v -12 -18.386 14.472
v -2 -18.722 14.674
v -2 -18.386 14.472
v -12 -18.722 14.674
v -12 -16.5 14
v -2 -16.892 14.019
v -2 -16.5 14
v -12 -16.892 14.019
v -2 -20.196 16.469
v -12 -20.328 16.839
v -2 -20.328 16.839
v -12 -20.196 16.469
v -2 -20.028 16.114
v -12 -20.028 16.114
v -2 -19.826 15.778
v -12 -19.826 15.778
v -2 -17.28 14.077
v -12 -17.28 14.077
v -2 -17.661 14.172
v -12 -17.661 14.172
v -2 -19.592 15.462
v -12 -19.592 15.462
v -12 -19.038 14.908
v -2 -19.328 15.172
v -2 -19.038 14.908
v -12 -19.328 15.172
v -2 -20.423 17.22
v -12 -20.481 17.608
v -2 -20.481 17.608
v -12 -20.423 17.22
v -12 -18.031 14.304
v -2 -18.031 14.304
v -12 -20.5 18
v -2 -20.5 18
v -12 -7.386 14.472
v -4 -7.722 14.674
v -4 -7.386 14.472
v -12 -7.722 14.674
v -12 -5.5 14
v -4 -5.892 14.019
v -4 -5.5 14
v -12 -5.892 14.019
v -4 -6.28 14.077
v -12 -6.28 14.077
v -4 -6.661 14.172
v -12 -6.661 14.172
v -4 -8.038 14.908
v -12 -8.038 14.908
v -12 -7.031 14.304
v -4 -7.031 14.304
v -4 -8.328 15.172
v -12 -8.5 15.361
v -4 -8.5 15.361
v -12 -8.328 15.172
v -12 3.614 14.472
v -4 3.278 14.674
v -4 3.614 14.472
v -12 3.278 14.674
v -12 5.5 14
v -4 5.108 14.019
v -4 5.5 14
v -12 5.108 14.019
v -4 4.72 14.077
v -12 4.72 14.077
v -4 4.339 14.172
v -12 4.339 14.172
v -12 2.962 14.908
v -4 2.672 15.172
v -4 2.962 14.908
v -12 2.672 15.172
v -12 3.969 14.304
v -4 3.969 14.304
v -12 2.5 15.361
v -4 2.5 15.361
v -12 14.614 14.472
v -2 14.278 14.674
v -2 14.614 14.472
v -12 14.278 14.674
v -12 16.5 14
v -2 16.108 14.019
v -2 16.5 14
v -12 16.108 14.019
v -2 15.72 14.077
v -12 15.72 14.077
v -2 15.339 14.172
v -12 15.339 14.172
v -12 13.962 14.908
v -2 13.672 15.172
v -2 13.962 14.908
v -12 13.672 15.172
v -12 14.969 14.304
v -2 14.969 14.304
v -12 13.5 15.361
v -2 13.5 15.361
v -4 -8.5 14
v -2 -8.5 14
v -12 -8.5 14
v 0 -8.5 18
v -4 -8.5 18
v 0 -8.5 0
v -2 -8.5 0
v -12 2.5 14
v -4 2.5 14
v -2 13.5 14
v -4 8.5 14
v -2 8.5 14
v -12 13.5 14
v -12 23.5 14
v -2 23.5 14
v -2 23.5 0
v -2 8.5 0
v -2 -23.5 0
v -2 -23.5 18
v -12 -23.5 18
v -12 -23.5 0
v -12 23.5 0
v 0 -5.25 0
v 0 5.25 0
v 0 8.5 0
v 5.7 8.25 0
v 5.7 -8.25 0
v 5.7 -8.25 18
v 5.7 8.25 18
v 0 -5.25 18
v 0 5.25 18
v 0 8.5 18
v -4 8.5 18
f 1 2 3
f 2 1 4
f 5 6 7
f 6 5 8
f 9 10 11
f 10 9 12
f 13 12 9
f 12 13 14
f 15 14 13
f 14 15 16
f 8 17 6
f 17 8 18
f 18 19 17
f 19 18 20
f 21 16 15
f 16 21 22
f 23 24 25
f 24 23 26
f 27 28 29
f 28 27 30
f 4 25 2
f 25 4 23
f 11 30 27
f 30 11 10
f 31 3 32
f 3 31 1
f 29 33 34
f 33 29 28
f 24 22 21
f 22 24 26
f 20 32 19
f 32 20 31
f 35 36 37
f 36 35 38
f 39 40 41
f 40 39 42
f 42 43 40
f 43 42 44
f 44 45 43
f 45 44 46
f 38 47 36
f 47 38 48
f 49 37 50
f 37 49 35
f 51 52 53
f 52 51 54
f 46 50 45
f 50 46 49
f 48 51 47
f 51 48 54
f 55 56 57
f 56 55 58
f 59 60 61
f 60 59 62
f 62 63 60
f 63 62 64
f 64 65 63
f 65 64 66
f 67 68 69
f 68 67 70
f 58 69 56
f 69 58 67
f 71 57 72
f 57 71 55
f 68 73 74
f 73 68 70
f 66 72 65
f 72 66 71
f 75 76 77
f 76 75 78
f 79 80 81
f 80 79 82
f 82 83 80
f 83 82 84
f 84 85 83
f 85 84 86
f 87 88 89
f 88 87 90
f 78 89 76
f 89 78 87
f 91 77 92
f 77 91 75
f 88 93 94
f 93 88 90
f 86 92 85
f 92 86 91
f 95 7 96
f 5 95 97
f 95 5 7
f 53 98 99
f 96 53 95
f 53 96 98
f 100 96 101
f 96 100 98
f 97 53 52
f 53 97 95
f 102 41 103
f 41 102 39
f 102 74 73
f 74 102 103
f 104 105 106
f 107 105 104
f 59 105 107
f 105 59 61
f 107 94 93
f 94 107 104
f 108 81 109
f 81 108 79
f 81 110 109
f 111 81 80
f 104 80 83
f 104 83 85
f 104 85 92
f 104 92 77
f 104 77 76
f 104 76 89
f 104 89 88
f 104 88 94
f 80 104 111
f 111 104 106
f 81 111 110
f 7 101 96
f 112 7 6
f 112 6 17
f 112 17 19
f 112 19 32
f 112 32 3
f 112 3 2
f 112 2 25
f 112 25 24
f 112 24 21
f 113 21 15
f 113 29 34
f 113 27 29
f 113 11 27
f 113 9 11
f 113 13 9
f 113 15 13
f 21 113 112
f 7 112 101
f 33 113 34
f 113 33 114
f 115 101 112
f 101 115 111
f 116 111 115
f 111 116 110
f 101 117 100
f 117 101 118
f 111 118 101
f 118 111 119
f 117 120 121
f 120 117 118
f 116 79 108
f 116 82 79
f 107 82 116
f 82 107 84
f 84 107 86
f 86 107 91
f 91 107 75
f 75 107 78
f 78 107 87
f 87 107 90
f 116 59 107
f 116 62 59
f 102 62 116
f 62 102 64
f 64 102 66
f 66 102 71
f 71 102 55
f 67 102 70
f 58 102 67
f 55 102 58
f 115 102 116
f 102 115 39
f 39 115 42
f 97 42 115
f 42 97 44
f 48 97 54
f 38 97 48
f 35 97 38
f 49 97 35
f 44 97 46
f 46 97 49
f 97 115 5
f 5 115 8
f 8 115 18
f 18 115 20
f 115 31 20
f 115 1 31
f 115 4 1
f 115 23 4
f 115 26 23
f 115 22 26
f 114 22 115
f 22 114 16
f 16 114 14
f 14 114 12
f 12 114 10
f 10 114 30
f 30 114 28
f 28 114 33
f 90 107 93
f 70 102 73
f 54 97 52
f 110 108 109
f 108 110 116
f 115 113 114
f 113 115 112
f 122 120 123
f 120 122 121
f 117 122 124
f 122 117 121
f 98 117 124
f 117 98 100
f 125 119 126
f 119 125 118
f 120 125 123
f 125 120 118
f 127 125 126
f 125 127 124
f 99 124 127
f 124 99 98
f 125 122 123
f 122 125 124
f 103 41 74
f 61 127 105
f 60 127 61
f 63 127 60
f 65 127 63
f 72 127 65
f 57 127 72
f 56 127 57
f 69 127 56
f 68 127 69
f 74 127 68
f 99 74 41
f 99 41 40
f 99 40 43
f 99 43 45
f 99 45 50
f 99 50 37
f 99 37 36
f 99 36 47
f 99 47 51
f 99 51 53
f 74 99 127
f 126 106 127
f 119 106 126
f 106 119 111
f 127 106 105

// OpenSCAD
// file: stand_cable_clamp_common.scad
// stand_cable_clamp_common.scad — modular cable clamp for round stand poles.
//
// A split C-clamp pops over the pole and an M5 bolt + wingnut cinches it tight
// (the bolt head is captured in a hex pocket, so you only turn the wingnut —
// tool-free reposition). A dovetail on the clamp face takes slide-on cable
// heads, so one clamp accepts any attachment.
//
//   clamp(tube_d)   — the pole clamp (set tube_d to your pole OD)
//   head_hook()     — open J-hook
//   head_clip()     — snap cable clip
//   head_comb()     — multi-cable comb
//   head_velcro()   — velcro-strap slot
//
// On-Stage SS8800B+ upper shaft = 34.9 mm (1⅜") or 38.1 mm (1½" w/ sleeve).
// Measure the crank-up column for a wider variant.

TUBE_D = 35;        // pole outer diameter (set per stand)
CLEAR  = 0.6;       // clamp bore clearance
WALL   = 5;         // clamp wall
H      = 22;        // clamp height (along the pole)
GAP    = 4;         // split-gap width
EAR_L  = 18; EAR_W = 10;
BOLT_D = 5.4;       // M5 clearance
HEX_AF = 8.2;       // M5 hex head/nut across-flats (capture pocket)
HEX_T  = 4.5;

// dovetail (undercut: mouth narrower than back so the head can't pull out)
DT_MOUTH = 11; DT_BACK = 17; DT_DEPTH = 6; DT_H = 18; DT_STOP = 3; DT_CLEAR = 0.5;
CABLE_D = 8;        // nominal cable diameter for clip/comb

$fn = 64;

// dovetail solid: mouth (narrow) at x=0 facing -X, widening to back at x=depth, extruded up Z
module dt_prism(mouth, back, depth, h) {
    linear_extrude(h) polygon([[0, -mouth/2], [0, mouth/2], [depth, back/2], [depth, -back/2]]);
}
module dt_tongue() { dt_prism(DT_MOUTH - DT_CLEAR, DT_BACK - DT_CLEAR, DT_DEPTH - 0.3, DT_H); }

// ---- clamp ----
module clamp(tube_d = TUBE_D) {
    ir = tube_d / 2 + CLEAR; orr = ir + WALL;
    boss_x = -orr - DT_DEPTH - 2;        // -X outer face of the dovetail boss
    difference() {
        union() {
            cylinder(h = H, r = orr);
            translate([orr - 3, GAP / 2, 0]) cube([EAR_L, EAR_W, H]);            // +Y ear
            translate([orr - 3, -GAP / 2 - EAR_W, 0]) cube([EAR_L, EAR_W, H]);   // -Y ear
            translate([boss_x, -(DT_BACK / 2 + 4), 0]) cube([DT_DEPTH + 5, DT_BACK + 8, H]); // dovetail boss
        }
        translate([0, 0, 0]) cylinder(h = 3 * H, r = ir, center = true);         // bore
        translate([0, -GAP / 2, -1]) cube([orr + EAR_L + 5, GAP, H + 2]);        // split slot
        // wingnut bolt through the ears (along Y)
        translate([orr + EAR_L - 8, GAP / 2 + EAR_W + 3, H / 2]) rotate([90, 0, 0]) cylinder(h = 2 * EAR_W + GAP + 8, d = BOLT_D);
        // hex pocket captures the bolt head on the +Y ear outer face
        translate([orr + EAR_L - 8, GAP / 2 + EAR_W + HEX_T, H / 2]) rotate([90, 0, 0]) cylinder(h = HEX_T + 1, d = HEX_AF / cos(30), $fn = 6);
        // dovetail socket groove (open top, solid below DT_STOP as a slide stop)
        translate([boss_x, 0, DT_STOP]) dt_prism(DT_MOUTH, DT_BACK, DT_DEPTH, H);
    }
}

// ---- heads (universal; mount via the dovetail tongue at x=0..DT_DEPTH) ----
module _backplate(t = 4) { translate([-t, -DT_BACK / 2, 0]) cube([t, DT_BACK, DT_H]); }

module head_hook() {
    dt_tongue(); _backplate();
    translate([-4, 0, DT_H / 2]) rotate([90, 0, 0])
        rotate_extrude(angle = 250) translate([16, 0]) circle(d = 7);
}
module head_clip(clip_w = 12) {
    dt_tongue(); _backplate();
    // C-clip (vertical cable), ring connects to the backplate on +X, mouth opens -X
    ring_out = CABLE_D + 5;
    translate([-4 - ring_out / 2 + 1.5, 0, (DT_H - clip_w) / 2])
        linear_extrude(clip_w) difference() {
            circle(d = ring_out);
            circle(d = CABLE_D + 0.7);
            translate([-ring_out, -(CABLE_D - 1.5) / 2]) square([ring_out, CABLE_D - 1.5]); // snap mouth (-X)
        }
}
module head_comb(n = 4) {
    dt_tongue(); _backplate();
    bar_w = n * (CABLE_D + 3) + 3;
    translate([-4 - 8, -bar_w / 2, 0]) difference() {
        cube([10, bar_w, DT_H]);
        for (i = [0 : n - 1]) translate([-1, 3 + i * (CABLE_D + 3) + CABLE_D / 2, DT_H]) rotate([0, 90, 0]) cylinder(d = CABLE_D, h = 12); // open-top slots
        for (i = [0 : n - 1]) translate([-1, 3 + i * (CABLE_D + 3) + CABLE_D / 2, DT_H - CABLE_D / 2]) cube([12, CABLE_D, CABLE_D]);
    }
}
module head_velcro(strap_w = 25, strap_t = 3) {
    dt_tongue(); _backplate();
    translate([-4 - 6, -(strap_w + 8) / 2, 0]) difference() {
        cube([6, strap_w + 8, DT_H]);
        translate([-1, 4, DT_H / 2 - strap_t / 2]) cube([8, strap_w, strap_t]); // strap thru-slot
    }
}
// main file
// head_comb — slide-on cable head (universal dovetail mount).
include <stand_cable_clamp_common.scad>
head_comb();
